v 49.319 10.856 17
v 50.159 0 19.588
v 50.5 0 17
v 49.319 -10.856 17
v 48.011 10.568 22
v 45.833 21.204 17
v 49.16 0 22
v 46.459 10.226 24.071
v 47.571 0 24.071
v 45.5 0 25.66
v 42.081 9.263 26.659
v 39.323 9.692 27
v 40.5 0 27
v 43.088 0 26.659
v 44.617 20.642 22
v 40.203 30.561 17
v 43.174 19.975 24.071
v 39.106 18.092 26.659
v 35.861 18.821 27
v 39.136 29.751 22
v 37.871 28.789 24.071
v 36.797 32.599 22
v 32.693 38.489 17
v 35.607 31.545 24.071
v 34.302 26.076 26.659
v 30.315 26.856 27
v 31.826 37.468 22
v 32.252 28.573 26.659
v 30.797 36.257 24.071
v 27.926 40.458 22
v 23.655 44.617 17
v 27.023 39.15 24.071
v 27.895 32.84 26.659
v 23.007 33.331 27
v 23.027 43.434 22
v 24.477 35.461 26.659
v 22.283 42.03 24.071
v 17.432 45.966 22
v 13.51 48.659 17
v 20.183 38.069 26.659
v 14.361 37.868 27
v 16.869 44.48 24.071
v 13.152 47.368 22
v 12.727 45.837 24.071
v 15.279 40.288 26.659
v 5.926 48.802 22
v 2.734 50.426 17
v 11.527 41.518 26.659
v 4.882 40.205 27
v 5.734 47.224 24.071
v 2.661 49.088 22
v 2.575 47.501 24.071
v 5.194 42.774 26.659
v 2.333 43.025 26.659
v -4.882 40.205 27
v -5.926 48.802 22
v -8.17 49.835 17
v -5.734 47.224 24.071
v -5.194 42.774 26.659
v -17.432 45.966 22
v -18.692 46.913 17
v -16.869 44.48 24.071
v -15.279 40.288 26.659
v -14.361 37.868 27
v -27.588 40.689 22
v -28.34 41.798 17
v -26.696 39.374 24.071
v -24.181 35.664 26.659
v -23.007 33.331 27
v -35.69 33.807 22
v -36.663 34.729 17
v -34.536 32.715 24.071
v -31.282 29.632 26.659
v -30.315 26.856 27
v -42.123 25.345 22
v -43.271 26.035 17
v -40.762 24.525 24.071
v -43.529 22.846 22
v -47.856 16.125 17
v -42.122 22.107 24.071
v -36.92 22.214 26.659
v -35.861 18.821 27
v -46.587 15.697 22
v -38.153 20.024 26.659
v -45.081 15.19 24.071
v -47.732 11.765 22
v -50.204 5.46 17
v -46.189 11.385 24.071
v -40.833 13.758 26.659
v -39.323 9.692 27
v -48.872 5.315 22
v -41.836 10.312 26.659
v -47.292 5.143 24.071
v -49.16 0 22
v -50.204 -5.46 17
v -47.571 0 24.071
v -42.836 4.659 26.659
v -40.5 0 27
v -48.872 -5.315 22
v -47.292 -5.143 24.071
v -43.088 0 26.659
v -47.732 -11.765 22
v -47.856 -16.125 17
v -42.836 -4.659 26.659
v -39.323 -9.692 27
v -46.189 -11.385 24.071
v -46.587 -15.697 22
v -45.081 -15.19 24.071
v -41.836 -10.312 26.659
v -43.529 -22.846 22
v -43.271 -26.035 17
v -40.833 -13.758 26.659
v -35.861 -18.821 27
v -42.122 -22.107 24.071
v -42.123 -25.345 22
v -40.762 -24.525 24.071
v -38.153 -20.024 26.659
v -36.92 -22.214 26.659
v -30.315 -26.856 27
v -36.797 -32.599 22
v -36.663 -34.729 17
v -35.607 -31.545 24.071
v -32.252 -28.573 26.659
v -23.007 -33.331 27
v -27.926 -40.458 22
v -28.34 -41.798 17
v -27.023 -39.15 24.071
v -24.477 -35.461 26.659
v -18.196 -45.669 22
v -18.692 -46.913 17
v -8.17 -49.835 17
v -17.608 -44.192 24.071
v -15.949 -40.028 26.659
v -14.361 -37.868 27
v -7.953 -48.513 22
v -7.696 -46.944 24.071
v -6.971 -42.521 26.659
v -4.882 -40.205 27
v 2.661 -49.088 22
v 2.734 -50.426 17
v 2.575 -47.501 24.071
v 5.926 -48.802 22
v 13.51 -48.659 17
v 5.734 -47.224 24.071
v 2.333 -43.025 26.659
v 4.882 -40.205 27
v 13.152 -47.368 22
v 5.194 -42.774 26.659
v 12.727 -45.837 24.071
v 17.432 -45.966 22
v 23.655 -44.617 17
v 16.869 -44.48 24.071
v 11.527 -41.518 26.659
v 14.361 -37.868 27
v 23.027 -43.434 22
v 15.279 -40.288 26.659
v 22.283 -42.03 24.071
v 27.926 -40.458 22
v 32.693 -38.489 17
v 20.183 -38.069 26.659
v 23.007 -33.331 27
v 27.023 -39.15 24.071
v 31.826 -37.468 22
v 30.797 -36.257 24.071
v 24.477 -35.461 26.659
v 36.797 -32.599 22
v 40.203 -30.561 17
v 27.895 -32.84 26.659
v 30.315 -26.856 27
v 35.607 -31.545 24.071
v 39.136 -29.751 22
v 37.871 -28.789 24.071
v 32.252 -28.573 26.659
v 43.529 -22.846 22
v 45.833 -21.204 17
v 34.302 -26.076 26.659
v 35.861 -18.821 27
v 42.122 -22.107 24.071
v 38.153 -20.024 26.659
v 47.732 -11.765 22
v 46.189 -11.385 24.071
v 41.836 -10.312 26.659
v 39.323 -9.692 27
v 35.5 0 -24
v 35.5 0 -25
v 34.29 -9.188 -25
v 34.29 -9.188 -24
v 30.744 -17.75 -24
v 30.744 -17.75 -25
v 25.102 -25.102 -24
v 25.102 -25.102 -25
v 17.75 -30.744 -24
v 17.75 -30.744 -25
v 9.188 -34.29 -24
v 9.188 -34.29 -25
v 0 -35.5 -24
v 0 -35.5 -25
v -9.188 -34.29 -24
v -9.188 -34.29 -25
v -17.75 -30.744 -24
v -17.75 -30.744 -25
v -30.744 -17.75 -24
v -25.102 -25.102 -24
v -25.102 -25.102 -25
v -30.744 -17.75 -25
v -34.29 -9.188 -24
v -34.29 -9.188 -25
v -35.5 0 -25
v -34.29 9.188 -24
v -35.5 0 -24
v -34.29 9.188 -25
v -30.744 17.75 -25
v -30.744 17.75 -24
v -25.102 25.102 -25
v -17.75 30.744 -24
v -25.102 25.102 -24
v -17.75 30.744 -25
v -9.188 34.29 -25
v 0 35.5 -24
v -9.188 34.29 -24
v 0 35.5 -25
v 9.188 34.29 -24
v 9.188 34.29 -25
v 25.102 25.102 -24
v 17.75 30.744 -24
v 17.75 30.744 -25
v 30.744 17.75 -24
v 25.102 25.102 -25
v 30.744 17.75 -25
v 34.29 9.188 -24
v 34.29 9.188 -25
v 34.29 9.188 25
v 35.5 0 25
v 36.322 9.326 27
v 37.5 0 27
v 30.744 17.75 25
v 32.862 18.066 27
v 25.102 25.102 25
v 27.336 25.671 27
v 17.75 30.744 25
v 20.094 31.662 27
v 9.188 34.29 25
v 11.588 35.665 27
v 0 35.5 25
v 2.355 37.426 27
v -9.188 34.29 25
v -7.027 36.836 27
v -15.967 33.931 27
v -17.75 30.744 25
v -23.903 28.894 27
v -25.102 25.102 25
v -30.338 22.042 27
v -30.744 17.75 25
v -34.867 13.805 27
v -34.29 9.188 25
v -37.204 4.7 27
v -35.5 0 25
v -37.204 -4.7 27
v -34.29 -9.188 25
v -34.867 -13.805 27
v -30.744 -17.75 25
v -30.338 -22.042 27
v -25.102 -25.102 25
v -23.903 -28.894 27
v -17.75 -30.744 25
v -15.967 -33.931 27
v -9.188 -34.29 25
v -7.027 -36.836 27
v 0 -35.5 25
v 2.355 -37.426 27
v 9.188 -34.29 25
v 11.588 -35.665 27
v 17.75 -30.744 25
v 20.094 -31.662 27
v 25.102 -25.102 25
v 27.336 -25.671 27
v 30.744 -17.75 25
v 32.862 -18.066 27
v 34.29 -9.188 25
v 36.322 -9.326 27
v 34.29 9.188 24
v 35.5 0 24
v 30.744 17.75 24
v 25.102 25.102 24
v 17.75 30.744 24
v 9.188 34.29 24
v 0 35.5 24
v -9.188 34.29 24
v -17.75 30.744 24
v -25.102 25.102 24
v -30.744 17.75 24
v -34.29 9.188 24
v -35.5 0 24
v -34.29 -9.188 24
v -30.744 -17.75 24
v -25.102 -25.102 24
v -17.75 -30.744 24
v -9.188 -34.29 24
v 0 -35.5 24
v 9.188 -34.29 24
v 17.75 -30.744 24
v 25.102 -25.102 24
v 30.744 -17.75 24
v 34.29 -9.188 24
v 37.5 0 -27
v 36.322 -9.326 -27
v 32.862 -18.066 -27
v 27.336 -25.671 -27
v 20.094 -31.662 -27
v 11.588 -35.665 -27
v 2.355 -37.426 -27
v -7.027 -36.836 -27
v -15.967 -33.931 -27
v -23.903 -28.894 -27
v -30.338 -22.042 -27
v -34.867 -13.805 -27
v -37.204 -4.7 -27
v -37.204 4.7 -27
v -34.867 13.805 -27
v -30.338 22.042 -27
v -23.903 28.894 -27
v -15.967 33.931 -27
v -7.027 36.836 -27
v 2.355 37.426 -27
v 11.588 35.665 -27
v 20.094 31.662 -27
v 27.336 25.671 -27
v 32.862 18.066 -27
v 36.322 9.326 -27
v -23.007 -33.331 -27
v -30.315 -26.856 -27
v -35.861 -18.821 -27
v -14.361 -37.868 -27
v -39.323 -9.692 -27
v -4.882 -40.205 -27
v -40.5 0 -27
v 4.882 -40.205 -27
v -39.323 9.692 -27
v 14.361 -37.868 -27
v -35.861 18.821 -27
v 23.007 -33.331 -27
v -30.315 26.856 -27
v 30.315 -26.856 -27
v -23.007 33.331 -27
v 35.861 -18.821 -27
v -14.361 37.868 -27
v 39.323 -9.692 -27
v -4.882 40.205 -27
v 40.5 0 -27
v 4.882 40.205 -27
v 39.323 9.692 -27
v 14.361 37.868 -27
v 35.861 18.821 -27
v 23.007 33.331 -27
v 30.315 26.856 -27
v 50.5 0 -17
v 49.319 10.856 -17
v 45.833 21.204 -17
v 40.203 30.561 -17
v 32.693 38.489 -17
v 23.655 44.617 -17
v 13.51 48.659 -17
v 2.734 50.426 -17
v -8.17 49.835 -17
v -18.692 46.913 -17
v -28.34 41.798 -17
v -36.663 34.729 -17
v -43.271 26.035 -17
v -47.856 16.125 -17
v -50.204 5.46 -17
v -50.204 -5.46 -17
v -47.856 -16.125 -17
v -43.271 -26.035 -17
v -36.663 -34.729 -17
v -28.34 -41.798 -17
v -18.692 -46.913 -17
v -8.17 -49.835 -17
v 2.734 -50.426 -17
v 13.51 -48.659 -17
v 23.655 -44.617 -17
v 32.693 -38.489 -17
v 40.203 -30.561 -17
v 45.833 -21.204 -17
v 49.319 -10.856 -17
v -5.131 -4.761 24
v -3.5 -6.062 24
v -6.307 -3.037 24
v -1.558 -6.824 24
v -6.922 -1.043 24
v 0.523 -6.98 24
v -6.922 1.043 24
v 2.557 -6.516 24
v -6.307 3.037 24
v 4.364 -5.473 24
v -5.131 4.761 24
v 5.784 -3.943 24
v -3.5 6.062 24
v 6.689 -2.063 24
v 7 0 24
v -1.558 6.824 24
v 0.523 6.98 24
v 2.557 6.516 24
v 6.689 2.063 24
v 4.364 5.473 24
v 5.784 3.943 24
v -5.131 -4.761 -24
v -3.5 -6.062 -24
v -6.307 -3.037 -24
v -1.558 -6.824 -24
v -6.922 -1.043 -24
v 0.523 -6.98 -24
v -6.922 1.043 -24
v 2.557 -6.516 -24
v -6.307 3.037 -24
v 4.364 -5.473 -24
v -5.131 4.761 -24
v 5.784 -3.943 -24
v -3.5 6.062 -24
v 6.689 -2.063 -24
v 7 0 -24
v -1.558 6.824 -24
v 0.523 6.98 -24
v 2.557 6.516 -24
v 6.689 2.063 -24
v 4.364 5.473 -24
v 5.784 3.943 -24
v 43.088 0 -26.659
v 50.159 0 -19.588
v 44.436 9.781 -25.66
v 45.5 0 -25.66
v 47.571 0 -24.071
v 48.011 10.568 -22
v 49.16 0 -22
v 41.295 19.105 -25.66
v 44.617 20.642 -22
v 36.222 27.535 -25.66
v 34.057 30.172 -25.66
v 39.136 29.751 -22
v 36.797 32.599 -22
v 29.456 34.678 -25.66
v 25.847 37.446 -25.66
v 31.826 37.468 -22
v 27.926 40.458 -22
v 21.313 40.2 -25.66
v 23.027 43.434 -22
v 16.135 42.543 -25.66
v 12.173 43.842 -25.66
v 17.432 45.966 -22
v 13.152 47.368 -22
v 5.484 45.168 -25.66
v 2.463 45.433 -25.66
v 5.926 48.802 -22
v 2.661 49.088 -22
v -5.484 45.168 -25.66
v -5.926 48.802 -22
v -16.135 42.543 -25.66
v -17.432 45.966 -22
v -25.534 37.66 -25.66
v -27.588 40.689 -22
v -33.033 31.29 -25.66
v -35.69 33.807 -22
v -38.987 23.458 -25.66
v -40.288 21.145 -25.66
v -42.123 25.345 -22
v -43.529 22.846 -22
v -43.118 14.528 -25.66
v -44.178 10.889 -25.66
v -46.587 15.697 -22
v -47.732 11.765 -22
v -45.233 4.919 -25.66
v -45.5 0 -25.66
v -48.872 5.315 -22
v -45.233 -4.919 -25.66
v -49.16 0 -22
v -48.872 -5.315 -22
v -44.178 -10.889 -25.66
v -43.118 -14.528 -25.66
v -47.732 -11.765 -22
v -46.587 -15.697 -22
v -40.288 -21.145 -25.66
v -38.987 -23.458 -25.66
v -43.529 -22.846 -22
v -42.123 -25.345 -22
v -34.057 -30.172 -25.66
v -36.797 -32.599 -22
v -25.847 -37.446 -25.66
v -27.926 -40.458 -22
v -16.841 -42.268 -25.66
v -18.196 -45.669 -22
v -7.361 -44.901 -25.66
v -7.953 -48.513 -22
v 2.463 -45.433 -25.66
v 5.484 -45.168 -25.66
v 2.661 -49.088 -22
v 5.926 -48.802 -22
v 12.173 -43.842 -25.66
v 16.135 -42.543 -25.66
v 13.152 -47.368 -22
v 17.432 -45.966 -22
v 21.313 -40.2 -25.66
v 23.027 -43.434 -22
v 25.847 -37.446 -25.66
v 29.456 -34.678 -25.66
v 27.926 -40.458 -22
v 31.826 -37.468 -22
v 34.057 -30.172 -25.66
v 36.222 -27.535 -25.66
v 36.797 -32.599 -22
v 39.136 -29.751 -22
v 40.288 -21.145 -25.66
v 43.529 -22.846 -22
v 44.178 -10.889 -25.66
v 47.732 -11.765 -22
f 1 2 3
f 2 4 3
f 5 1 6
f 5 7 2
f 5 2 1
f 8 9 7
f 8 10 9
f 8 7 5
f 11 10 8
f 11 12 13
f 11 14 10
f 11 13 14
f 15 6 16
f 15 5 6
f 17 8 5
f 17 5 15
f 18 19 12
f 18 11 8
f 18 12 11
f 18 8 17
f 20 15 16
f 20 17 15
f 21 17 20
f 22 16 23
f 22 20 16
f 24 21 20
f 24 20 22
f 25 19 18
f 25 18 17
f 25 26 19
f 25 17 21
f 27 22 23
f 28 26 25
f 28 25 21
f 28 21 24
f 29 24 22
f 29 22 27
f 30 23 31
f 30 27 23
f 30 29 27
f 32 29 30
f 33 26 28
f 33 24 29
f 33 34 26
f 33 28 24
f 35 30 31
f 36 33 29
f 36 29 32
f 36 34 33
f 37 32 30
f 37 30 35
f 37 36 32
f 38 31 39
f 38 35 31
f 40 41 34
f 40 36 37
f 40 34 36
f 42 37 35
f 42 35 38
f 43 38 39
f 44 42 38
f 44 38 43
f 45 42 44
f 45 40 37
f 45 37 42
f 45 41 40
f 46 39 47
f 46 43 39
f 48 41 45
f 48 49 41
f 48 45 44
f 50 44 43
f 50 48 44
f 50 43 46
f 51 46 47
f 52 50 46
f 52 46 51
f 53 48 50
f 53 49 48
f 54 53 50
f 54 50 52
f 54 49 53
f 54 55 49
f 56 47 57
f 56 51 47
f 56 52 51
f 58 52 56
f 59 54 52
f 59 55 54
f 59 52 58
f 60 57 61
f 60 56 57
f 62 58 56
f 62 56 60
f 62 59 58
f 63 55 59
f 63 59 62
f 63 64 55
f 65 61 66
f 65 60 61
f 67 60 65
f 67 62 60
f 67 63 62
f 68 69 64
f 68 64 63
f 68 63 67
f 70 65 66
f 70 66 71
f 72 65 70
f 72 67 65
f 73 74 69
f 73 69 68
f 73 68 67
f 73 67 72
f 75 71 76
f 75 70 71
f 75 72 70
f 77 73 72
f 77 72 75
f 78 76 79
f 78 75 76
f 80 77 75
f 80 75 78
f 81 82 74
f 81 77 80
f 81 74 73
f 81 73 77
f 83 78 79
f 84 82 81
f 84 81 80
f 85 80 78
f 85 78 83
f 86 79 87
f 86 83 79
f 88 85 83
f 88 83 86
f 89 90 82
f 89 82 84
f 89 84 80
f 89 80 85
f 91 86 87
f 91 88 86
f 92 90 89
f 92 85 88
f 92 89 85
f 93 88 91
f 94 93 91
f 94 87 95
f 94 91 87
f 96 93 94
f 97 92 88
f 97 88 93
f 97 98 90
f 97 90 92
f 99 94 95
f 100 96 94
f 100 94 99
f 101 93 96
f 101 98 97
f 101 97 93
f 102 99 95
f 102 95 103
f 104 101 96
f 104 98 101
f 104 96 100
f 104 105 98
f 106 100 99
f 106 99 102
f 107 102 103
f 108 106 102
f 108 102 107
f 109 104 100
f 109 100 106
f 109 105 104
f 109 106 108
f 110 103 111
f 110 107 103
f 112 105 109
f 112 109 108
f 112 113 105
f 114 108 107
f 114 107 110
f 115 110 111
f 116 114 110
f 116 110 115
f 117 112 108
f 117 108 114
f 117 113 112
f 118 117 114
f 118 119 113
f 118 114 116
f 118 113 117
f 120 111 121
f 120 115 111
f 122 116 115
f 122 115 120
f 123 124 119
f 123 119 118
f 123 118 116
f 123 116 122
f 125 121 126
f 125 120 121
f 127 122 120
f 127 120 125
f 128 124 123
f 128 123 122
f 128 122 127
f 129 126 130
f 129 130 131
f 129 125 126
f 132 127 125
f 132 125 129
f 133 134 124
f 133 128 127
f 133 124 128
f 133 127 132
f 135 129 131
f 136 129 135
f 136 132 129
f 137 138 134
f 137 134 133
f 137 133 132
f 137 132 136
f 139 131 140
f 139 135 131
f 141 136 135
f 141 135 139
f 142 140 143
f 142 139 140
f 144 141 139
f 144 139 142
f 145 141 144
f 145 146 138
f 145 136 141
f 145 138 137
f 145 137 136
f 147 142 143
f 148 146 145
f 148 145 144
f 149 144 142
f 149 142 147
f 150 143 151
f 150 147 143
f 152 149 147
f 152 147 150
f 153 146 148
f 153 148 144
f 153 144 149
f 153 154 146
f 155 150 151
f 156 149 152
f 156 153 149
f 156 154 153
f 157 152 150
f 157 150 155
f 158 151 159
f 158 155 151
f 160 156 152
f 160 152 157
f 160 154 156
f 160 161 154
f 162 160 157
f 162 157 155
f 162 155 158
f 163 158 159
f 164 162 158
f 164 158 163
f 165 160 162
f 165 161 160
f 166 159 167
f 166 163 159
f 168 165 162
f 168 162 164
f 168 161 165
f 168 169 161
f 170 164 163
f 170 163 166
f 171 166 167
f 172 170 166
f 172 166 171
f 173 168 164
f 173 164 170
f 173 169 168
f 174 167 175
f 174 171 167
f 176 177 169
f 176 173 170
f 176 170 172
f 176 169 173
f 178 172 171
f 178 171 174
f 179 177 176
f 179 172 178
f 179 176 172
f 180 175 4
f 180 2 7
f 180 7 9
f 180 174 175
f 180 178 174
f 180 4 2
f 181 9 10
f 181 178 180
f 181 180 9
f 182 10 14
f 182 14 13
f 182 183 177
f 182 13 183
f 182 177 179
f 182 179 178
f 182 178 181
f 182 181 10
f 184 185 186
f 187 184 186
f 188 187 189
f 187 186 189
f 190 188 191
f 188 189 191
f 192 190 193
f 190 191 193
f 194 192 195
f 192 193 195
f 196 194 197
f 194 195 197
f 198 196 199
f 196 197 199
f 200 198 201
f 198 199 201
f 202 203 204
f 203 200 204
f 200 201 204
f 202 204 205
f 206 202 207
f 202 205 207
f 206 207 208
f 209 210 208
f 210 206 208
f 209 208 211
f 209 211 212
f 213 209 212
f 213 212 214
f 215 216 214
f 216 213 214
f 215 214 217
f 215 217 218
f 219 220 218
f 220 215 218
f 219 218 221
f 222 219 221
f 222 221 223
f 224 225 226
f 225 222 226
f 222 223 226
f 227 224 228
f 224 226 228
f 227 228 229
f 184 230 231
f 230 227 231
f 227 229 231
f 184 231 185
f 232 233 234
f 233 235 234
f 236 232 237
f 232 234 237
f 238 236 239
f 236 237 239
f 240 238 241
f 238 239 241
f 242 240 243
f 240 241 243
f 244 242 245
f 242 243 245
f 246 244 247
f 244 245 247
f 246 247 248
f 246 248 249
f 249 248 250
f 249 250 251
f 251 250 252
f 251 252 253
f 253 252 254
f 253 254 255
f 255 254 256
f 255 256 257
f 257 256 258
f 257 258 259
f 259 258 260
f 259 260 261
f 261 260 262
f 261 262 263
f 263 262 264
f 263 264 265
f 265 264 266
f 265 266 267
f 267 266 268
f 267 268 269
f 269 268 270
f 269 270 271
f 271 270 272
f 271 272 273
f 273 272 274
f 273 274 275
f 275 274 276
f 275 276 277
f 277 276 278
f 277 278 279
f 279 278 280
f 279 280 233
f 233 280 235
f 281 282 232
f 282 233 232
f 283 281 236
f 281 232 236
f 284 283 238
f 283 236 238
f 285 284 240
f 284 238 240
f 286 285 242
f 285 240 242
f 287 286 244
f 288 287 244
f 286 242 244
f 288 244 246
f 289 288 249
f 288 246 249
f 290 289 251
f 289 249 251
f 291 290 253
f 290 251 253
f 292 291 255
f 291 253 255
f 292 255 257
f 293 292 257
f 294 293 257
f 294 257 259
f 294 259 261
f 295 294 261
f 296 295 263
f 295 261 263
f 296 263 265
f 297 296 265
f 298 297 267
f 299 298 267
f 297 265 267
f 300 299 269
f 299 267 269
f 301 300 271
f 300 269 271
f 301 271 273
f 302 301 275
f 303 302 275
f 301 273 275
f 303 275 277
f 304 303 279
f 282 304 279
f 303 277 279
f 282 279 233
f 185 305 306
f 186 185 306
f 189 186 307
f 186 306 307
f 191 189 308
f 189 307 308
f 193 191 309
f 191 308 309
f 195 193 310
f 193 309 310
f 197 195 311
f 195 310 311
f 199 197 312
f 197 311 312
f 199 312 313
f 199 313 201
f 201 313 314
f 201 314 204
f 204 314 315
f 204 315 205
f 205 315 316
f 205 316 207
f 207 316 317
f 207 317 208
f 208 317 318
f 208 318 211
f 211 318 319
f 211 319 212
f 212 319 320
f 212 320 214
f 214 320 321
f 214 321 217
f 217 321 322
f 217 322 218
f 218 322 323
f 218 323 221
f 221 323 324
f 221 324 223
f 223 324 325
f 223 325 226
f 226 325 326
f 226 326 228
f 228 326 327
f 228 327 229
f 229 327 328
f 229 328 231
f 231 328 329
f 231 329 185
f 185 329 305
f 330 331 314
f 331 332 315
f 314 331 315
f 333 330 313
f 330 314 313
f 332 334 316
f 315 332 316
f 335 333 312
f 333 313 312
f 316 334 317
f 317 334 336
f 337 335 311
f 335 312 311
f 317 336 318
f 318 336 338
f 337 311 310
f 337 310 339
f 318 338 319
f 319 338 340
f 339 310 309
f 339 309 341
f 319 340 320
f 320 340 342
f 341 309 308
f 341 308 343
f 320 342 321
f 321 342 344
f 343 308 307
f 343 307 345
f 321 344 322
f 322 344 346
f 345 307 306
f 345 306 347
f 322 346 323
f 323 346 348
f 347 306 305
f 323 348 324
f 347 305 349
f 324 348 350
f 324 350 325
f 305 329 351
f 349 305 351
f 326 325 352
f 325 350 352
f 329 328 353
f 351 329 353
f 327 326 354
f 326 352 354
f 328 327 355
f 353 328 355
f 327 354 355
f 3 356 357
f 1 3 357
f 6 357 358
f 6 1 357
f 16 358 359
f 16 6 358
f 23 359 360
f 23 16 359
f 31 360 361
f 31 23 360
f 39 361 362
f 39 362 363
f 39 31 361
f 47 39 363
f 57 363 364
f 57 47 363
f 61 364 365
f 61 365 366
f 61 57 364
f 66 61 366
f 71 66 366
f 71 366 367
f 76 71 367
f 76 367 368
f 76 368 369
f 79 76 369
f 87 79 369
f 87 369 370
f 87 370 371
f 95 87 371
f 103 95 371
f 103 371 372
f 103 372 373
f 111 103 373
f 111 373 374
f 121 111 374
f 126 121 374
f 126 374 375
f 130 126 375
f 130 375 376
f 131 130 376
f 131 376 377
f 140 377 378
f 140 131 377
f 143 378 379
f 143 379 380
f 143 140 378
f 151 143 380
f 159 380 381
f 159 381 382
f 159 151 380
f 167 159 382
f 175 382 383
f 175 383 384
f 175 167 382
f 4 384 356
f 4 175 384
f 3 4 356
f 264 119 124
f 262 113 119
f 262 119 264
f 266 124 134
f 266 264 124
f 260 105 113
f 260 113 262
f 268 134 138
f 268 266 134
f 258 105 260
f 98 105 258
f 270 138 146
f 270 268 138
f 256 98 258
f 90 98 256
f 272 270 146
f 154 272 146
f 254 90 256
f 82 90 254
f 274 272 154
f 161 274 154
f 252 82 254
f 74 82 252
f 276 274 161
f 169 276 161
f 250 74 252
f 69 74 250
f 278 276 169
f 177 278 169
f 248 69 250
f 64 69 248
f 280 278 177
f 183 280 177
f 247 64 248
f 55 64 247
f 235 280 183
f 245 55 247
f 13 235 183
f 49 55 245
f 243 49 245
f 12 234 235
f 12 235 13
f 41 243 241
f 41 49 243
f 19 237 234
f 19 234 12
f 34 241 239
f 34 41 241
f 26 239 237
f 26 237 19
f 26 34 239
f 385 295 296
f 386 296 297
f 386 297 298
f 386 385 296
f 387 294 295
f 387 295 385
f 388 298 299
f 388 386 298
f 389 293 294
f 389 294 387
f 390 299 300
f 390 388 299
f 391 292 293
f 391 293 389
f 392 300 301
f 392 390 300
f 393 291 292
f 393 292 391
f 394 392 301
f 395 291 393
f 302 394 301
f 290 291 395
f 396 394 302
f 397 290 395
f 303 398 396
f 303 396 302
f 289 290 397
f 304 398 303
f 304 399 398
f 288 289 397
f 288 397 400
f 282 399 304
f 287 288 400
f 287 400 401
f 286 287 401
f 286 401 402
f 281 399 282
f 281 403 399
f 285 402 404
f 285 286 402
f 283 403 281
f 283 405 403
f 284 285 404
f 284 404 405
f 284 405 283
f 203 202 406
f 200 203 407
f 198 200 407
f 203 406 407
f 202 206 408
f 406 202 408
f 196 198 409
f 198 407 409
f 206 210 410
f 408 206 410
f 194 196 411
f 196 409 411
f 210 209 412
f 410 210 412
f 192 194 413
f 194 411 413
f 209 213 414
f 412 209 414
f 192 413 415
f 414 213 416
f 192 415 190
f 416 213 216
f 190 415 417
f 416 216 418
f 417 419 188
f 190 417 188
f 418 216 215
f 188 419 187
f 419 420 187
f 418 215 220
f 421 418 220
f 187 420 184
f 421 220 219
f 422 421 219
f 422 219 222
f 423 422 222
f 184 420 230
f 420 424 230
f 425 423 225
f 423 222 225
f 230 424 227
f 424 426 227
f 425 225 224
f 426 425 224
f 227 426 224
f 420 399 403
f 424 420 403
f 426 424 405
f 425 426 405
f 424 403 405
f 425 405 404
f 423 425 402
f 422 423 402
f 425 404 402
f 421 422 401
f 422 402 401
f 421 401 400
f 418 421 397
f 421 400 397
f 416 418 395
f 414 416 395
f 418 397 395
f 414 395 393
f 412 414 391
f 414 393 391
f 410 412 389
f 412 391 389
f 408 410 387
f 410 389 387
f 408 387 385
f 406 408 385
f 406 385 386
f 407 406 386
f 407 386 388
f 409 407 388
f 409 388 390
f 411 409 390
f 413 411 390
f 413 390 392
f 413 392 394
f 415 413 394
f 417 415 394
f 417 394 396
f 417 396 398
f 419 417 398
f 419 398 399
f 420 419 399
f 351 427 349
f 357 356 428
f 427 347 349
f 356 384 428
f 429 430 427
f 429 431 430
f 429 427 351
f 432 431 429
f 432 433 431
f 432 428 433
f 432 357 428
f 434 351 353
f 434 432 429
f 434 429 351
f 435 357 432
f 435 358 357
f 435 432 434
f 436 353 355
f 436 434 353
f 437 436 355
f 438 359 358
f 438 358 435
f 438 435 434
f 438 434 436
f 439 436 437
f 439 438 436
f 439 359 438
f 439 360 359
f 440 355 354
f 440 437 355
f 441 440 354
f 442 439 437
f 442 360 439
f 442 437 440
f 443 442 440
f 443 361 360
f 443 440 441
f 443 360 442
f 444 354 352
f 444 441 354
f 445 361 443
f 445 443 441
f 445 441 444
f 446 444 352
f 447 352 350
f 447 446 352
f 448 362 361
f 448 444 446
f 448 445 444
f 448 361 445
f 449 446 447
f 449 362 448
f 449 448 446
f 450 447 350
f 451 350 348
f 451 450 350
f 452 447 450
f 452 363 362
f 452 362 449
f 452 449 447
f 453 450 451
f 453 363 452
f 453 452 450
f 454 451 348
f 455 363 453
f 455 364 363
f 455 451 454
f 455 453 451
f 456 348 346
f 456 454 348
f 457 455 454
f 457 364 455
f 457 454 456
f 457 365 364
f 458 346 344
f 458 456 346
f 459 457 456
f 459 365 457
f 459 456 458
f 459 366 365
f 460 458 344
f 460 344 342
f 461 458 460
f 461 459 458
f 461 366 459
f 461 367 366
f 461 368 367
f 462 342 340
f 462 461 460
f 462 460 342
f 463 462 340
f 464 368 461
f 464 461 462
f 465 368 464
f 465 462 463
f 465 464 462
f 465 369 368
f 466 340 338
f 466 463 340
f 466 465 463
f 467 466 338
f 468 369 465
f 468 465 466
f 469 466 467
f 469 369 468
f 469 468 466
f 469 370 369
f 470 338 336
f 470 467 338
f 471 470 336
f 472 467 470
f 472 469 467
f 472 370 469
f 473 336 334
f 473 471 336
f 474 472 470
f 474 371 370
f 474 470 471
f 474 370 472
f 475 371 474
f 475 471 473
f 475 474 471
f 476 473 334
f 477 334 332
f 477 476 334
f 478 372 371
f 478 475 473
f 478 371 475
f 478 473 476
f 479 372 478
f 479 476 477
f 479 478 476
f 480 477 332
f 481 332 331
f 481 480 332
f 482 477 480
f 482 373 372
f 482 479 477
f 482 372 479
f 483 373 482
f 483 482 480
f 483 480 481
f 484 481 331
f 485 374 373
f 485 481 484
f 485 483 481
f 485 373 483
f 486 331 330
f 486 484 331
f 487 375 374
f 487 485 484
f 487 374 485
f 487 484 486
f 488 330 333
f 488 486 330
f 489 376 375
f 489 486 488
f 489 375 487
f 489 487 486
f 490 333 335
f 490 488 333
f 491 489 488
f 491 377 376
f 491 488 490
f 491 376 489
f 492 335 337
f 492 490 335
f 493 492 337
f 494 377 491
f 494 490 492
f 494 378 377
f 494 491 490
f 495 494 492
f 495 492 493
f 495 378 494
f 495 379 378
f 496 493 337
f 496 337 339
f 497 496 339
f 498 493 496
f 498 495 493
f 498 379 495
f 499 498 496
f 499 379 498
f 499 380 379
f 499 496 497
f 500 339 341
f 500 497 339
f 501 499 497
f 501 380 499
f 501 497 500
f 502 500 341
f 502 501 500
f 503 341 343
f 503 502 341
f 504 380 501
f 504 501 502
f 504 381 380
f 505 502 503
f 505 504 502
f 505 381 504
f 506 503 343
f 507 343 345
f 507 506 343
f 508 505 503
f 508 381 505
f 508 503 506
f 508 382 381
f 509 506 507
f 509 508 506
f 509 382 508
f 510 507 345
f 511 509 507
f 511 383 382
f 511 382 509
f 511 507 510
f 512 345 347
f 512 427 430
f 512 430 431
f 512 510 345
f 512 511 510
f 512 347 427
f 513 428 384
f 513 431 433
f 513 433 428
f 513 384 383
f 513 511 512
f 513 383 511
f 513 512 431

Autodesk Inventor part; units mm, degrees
ref_plane "YZ Plane" through (0, 0, 0) normal (1, 0, 0) x (0, 1, 0)
ref_plane "XZ Plane" through (0, 0, 0) normal (0, 1, 0) x (-1, 0, 0)
ref_plane "XY Plane" through (0, 0, 0) normal (0, 0, 1) x (1, 0, 0)
sketch "Sketch2" plane through (0, 0, 0) normal (0, 0, 1) x (1, 0, 0)
  circle A0 centre (0, 0) radius 50.5
  circle A1 centre (0, 0) radius 47.5
  circle A2 centre (0, 0) radius 35.5
  circle A3 centre (0, 0) radius 7
  dimension "d0" = 101
  dimension "d1" = 3
  dimension "d2" = 15
  dimension "d3" = 14
extrude "Extrusion1" add sketch "Sketch2" along normal blind 27 and the other way blind 27 contours A0 | A1 | A2
extrude "Extrusion2" cut sketch "Sketch2" against normal blind 3 from surface at 27 contours A2
extrude "Extrusion3" cut sketch "Sketch2" along normal blind 3 from surface at -27 contours A2
chamfer "Chamfer1" distance 2 angle 45 2 edges at (-35.5, 0, 27) (-35.5, 0, -27)
fillet "Fillet1" radius 10 2 edges at (-50.5, 0, -27) (-50.5, 0, 27)
properties part number "wheel_stand_in"
